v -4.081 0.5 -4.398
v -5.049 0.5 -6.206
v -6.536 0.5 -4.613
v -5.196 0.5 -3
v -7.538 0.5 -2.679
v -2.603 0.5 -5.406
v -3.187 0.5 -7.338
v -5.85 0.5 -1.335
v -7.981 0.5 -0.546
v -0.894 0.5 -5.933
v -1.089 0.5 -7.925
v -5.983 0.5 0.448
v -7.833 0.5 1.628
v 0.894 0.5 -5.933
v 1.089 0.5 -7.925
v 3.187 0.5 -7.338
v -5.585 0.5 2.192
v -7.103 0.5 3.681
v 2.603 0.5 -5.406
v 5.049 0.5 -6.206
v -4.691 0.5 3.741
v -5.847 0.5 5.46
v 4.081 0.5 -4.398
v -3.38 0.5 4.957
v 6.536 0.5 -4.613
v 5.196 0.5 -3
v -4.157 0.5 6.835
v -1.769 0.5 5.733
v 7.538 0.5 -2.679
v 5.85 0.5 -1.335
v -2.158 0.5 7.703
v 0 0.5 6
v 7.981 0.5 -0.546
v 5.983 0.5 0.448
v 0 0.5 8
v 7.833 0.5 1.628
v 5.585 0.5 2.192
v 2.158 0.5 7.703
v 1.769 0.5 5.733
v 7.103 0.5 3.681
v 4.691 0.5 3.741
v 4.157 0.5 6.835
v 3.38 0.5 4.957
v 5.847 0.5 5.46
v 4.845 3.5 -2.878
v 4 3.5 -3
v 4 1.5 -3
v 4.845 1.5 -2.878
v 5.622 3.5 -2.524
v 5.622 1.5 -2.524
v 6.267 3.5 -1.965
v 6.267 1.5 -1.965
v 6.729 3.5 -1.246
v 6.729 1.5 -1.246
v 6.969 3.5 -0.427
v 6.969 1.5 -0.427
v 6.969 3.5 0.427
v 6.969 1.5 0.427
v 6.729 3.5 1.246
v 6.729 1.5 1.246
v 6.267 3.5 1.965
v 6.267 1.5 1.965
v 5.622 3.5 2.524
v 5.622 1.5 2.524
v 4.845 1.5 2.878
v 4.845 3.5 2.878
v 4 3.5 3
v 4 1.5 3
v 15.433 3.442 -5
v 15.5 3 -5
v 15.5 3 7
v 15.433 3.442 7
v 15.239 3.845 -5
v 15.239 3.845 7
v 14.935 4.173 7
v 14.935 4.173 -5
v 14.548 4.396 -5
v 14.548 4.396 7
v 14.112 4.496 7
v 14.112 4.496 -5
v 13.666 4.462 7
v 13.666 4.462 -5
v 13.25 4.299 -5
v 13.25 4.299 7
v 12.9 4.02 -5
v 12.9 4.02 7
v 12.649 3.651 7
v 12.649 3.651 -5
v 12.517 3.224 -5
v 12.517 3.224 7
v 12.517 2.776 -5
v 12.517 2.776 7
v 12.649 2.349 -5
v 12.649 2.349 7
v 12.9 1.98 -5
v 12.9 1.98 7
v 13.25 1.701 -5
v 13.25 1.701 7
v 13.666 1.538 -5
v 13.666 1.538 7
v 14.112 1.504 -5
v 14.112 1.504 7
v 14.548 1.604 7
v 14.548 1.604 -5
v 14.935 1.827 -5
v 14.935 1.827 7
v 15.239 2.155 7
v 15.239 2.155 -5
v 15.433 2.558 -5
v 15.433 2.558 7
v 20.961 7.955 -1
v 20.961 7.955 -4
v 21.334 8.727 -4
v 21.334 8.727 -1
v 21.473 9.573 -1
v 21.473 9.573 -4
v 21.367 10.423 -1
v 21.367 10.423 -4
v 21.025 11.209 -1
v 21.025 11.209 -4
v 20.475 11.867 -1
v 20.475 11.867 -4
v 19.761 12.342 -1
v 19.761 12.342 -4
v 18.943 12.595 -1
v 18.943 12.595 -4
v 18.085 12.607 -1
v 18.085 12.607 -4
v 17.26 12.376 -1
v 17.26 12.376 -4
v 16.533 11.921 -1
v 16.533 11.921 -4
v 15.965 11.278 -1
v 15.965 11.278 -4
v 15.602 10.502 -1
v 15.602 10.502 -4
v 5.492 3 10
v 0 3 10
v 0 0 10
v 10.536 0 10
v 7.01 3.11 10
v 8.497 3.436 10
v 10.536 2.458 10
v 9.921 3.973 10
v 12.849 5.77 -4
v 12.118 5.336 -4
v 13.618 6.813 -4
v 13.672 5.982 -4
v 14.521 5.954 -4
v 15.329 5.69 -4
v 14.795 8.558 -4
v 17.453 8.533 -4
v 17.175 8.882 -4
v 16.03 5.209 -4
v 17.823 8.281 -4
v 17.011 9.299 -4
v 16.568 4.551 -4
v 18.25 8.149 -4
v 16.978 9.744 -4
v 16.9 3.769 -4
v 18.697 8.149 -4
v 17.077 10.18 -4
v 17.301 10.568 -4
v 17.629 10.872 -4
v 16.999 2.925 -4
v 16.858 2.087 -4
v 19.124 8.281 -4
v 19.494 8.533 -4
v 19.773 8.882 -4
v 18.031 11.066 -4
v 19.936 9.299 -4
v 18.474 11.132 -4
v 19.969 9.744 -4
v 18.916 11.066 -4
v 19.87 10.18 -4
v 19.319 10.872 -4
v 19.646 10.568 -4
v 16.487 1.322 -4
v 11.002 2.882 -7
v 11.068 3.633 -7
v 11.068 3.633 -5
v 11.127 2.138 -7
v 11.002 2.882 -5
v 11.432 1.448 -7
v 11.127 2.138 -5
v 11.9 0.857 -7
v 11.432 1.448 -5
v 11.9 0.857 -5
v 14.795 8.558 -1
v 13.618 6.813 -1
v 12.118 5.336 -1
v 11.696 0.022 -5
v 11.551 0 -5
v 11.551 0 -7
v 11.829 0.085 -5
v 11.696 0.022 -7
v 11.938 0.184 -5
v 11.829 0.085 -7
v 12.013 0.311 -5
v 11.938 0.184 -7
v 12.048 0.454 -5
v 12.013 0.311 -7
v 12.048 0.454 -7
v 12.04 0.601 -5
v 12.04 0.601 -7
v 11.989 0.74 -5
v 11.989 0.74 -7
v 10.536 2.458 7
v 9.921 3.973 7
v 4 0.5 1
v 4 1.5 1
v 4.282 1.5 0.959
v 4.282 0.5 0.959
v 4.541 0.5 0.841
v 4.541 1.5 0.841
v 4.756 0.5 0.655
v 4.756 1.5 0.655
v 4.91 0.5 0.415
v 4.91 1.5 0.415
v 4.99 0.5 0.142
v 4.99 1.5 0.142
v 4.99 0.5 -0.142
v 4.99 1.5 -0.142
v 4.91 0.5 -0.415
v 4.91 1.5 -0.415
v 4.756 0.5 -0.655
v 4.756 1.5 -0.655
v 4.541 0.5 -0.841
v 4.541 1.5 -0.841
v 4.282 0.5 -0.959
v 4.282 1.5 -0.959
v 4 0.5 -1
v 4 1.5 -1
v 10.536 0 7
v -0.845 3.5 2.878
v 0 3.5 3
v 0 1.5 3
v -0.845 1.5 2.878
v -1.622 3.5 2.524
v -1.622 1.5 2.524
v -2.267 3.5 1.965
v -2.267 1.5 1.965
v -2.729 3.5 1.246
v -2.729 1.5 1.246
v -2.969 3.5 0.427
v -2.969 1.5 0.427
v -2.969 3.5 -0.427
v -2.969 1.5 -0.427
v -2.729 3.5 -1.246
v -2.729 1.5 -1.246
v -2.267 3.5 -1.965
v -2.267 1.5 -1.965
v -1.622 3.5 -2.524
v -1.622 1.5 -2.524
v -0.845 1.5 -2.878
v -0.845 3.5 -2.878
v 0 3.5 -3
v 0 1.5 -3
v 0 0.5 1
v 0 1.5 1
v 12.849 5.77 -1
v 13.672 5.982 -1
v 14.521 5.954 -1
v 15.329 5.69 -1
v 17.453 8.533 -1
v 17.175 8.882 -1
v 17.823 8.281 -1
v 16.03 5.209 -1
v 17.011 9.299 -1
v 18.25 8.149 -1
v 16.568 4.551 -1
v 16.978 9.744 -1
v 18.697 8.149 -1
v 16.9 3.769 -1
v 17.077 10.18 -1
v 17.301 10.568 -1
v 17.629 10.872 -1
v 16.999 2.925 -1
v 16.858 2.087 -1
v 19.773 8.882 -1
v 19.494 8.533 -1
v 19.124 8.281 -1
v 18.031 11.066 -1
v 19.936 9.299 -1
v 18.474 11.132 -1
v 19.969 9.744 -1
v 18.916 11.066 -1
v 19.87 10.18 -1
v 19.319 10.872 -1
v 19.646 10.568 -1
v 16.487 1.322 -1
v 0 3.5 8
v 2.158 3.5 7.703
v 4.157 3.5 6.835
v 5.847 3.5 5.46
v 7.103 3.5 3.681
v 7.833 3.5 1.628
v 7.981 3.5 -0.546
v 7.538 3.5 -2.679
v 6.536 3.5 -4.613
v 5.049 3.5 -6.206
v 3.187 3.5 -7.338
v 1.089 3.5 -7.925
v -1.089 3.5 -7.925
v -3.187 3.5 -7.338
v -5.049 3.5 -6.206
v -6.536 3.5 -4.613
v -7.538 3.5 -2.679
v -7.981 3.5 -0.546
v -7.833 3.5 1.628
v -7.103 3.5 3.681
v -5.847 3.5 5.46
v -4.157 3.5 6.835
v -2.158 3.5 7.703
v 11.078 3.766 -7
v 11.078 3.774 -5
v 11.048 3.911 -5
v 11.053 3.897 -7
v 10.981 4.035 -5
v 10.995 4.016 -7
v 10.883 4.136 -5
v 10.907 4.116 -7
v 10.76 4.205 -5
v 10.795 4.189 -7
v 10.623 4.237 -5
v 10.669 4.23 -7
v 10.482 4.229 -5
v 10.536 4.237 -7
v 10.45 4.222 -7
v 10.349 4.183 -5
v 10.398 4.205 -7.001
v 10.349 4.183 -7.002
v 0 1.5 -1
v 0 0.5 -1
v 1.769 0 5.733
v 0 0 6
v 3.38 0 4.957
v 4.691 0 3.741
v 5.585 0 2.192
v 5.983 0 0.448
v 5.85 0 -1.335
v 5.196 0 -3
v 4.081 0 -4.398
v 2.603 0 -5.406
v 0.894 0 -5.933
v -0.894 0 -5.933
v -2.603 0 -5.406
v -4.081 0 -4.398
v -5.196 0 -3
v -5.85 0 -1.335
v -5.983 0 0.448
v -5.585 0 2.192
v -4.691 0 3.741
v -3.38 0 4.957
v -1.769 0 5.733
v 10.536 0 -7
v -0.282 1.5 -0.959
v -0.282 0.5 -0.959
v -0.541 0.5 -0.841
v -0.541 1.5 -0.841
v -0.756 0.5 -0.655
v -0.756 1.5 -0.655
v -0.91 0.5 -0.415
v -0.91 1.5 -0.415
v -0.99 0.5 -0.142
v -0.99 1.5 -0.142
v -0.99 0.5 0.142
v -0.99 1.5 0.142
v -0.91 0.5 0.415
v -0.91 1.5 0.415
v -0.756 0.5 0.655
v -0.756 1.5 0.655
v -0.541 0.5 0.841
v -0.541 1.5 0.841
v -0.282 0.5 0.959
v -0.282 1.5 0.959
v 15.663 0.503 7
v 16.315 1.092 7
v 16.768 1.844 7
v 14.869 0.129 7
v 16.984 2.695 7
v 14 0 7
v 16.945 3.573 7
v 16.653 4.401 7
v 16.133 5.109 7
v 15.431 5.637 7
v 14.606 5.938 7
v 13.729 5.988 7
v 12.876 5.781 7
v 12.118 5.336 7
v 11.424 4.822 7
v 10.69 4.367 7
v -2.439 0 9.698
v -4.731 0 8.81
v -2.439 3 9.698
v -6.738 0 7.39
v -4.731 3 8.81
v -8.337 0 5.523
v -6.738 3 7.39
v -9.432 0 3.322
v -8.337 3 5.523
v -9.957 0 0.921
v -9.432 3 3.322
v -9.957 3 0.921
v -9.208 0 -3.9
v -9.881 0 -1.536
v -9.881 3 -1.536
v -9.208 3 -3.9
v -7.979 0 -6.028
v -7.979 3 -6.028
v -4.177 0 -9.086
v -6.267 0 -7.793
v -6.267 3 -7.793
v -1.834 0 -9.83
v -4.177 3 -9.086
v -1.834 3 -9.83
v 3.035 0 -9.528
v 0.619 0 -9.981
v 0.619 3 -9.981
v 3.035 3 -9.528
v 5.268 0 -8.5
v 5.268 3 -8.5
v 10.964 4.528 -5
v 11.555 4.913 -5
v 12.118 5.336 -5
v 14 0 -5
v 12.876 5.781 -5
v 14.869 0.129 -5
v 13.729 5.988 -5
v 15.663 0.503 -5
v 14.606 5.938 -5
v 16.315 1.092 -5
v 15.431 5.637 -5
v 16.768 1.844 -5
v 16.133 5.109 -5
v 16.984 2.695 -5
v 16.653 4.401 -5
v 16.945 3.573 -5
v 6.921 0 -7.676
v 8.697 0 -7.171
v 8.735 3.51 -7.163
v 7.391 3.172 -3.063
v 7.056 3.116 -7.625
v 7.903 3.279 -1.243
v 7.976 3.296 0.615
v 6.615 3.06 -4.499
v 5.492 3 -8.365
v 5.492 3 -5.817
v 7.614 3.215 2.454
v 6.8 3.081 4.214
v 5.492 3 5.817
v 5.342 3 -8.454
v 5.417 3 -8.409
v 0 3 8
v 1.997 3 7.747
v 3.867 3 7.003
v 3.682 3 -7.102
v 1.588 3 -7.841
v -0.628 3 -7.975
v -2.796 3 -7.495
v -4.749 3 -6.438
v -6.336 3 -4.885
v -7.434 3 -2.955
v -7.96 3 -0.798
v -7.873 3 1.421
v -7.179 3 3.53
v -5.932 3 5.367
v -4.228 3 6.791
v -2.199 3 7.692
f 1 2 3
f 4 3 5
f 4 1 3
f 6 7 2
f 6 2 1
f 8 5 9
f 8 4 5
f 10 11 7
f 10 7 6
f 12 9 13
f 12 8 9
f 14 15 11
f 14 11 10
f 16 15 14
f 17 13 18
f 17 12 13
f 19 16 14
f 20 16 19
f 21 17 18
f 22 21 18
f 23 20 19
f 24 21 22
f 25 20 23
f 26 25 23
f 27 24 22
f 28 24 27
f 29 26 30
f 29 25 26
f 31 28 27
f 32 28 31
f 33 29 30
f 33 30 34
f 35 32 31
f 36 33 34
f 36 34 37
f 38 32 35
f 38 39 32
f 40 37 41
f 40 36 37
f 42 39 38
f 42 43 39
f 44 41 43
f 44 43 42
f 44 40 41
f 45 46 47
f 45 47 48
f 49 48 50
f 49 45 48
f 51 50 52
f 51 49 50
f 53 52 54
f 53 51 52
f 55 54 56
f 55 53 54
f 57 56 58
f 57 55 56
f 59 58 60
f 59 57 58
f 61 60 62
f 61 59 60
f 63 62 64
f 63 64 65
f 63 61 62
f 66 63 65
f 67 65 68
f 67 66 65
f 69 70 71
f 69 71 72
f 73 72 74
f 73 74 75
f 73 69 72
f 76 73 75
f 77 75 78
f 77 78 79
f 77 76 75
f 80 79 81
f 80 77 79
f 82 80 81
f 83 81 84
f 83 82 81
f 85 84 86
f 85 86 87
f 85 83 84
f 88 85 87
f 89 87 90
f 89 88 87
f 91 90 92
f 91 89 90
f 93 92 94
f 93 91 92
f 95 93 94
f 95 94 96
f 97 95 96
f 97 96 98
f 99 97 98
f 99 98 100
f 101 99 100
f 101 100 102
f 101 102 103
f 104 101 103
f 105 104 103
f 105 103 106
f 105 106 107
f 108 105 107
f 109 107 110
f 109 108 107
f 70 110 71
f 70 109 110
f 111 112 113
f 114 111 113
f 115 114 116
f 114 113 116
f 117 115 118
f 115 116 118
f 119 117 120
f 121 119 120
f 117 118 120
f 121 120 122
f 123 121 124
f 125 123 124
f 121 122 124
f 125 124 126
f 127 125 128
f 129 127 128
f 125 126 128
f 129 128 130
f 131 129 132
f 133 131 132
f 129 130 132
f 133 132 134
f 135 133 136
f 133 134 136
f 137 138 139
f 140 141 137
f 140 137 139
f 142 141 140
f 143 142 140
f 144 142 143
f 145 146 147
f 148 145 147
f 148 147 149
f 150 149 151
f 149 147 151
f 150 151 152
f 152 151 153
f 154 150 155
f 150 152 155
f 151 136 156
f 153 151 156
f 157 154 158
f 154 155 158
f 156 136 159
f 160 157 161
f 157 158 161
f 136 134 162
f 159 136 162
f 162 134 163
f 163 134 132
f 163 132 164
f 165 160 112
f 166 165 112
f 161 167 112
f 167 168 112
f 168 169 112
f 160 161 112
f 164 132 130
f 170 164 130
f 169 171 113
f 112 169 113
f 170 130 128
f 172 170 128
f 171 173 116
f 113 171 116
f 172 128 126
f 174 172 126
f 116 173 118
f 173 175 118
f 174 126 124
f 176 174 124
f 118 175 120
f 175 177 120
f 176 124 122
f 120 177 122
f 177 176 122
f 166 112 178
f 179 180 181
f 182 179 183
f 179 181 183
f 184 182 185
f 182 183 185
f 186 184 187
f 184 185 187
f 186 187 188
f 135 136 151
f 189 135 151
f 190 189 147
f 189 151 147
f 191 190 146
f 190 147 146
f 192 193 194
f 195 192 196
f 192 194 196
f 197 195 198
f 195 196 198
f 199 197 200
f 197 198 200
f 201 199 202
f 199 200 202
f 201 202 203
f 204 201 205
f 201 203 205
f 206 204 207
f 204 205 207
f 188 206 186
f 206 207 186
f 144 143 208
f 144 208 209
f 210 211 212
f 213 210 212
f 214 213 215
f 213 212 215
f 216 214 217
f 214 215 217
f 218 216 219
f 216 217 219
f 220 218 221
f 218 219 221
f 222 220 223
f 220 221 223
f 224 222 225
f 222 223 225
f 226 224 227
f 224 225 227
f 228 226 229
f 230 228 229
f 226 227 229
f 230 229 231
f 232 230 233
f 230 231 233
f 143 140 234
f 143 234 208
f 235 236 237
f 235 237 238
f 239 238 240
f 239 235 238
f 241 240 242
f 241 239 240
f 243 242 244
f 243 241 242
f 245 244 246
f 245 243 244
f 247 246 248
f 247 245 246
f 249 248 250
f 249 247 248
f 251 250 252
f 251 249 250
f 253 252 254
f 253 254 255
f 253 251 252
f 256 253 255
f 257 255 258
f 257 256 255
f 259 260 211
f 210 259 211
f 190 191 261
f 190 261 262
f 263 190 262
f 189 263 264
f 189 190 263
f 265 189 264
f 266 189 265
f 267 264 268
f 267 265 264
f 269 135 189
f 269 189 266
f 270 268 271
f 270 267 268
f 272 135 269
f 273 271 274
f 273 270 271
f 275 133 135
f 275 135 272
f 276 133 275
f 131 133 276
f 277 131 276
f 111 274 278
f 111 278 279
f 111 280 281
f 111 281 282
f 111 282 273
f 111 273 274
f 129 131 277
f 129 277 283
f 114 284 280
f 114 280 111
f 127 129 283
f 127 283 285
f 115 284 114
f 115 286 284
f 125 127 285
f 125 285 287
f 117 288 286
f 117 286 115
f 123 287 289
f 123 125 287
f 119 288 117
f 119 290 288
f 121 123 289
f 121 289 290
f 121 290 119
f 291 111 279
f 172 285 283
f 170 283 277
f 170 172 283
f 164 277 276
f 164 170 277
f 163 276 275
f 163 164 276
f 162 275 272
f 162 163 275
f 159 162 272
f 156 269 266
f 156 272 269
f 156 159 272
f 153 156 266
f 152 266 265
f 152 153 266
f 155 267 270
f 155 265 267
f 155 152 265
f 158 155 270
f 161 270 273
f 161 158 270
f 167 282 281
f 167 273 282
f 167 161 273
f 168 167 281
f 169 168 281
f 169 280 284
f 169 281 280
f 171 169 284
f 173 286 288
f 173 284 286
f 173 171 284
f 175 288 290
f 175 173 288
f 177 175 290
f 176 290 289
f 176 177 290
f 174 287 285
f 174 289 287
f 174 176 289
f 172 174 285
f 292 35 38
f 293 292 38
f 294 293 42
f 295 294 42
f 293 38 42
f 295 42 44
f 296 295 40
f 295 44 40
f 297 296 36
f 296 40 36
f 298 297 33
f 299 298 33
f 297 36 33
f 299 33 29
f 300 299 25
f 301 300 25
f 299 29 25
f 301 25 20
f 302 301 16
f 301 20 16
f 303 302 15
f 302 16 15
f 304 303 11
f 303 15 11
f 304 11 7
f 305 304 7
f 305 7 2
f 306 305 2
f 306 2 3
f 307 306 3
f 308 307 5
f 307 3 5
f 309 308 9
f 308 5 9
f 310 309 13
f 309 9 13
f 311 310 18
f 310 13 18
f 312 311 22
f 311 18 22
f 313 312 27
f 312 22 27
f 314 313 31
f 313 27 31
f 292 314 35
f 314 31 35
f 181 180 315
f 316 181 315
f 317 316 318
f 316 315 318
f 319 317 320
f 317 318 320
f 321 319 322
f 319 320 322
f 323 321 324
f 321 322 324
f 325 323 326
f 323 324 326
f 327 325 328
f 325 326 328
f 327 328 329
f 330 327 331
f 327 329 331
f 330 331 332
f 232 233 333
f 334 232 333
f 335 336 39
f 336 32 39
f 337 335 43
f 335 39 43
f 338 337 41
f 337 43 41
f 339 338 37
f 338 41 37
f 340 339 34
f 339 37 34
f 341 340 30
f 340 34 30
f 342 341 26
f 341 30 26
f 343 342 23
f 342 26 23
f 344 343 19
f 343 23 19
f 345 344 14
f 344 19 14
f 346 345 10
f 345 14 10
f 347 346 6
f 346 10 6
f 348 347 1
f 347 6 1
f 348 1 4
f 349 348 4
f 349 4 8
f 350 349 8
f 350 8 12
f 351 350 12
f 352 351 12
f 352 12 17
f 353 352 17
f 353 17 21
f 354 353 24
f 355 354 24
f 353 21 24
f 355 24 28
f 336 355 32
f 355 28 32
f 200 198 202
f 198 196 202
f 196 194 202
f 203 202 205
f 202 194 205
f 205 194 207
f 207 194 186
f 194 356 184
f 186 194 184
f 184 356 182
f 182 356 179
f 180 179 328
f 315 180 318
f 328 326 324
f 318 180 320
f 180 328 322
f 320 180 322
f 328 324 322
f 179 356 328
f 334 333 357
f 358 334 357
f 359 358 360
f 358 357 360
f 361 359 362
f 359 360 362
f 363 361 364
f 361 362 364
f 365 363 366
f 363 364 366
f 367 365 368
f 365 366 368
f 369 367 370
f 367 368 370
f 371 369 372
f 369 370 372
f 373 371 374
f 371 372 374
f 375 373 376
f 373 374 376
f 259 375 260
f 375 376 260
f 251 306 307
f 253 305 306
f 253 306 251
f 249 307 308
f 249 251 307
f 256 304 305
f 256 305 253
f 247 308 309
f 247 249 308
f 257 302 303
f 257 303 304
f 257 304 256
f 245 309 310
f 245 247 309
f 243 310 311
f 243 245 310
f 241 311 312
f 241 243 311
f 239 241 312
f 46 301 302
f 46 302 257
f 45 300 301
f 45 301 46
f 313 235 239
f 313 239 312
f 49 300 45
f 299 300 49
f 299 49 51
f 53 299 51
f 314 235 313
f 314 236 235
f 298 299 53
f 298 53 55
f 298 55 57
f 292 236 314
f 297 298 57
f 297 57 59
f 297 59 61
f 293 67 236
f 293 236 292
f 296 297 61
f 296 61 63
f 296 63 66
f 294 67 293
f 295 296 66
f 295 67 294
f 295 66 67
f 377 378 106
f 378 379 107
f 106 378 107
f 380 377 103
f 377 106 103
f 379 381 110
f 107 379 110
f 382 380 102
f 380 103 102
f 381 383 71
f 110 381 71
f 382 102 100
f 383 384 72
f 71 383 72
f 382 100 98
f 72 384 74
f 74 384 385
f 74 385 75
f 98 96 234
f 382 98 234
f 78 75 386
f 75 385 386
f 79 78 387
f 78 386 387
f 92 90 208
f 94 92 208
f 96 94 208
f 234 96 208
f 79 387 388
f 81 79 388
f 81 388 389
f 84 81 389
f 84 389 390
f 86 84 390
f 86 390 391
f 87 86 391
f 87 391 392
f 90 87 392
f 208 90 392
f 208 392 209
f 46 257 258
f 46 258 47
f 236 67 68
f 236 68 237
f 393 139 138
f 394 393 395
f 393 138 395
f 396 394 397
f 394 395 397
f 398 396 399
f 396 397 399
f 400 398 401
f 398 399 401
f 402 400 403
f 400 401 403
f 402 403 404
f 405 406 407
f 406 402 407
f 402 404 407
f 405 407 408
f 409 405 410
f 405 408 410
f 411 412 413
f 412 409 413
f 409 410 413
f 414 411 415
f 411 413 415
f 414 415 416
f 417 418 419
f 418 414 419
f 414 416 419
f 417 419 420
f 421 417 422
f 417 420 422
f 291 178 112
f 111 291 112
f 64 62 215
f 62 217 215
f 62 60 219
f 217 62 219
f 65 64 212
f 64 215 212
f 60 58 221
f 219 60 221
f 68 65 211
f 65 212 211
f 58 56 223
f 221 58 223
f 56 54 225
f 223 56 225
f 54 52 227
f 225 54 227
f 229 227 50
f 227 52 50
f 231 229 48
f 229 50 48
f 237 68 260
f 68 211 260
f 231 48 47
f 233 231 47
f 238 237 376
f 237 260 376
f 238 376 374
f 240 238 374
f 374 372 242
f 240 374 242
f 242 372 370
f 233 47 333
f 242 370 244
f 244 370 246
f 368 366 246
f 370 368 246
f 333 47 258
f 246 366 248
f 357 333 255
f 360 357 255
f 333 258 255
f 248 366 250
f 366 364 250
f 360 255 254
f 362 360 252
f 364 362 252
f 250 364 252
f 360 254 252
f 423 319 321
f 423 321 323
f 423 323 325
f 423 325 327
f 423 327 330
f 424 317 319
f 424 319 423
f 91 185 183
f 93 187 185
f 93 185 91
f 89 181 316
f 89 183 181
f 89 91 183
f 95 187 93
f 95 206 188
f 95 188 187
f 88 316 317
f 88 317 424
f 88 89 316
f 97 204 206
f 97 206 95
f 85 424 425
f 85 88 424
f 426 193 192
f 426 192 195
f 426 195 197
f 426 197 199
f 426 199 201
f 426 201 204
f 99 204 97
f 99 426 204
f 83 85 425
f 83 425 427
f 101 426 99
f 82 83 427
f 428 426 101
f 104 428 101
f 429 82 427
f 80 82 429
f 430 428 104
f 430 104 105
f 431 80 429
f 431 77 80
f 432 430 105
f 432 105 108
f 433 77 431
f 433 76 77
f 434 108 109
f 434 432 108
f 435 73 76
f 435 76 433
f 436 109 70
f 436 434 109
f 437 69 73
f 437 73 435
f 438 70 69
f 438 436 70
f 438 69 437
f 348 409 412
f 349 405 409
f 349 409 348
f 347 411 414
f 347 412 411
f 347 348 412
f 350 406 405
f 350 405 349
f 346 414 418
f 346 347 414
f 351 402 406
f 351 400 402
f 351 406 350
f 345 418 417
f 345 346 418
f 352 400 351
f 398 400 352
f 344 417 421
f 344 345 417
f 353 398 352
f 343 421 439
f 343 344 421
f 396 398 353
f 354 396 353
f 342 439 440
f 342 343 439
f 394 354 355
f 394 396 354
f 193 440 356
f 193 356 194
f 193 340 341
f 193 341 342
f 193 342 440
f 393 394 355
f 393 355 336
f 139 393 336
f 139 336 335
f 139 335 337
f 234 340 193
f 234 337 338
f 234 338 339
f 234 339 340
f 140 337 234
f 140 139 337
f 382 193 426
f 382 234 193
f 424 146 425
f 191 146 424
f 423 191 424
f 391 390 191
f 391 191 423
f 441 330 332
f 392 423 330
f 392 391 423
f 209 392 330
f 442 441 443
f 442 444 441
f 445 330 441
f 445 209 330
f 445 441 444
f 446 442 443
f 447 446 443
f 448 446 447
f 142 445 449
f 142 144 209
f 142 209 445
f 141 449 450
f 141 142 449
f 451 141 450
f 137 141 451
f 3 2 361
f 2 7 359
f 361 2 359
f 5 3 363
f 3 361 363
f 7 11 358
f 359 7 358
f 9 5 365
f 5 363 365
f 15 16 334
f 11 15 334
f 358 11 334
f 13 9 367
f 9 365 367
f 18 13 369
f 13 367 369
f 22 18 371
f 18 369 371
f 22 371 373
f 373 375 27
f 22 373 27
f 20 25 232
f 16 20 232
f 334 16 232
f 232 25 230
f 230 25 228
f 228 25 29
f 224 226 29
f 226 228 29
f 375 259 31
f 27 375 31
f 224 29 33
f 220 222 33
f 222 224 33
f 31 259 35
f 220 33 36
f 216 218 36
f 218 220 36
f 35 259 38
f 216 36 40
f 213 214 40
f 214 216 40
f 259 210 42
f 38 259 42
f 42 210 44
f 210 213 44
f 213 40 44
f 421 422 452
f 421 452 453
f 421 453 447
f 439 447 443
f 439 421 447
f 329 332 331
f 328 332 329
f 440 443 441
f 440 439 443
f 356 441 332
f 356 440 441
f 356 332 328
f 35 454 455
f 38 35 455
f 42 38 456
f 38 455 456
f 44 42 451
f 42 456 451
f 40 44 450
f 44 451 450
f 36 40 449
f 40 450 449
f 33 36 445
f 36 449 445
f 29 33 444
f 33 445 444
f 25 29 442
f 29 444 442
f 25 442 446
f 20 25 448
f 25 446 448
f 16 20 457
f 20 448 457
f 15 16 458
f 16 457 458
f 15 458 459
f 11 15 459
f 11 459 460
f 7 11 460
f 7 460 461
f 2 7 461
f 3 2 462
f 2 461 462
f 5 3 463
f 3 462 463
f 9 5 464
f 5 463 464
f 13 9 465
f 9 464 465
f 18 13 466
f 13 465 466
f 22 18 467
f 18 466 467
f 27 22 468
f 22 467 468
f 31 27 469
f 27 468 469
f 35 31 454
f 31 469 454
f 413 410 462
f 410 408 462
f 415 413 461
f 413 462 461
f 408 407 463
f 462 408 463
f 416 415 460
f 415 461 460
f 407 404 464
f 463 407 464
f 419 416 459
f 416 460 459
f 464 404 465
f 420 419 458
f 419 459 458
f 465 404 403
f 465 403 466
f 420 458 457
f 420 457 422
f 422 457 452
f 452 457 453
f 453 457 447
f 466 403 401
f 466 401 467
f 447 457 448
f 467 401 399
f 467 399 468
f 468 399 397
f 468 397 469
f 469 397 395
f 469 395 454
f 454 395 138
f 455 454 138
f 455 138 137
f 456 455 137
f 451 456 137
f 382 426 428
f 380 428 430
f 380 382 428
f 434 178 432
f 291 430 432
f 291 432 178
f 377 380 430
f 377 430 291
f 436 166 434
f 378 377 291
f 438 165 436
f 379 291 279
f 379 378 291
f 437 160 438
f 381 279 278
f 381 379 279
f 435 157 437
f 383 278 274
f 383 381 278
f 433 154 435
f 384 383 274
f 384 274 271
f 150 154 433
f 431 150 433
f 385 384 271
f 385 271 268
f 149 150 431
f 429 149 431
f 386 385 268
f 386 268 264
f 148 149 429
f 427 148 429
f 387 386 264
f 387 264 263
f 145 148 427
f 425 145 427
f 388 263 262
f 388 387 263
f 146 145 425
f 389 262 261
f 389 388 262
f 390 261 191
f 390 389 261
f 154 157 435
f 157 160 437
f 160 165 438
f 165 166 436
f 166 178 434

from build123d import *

# Parameters (mm, degrees)
SKETCH1_R           = 10
BOSS_EXTRUDE1_DEPTH = 3
BOSS_EXTRUDE2_DEPTH = 10
CUT_EXTRUDE1_DEPTH  = 8
BOSS_EXTRUDE6_START = -4
BOSS_EXTRUDE6_DEPTH = 3
FILLET1_R           = 10
SKETCH4_R           = 2.999999999999999
CUT_EXTRUDE2_DEPTH  = 2
SKETCH5_R           = 8
CUT_EXTRUDE3_DEPTH  = 2.5
SKETCH6_R           = 6
CUT_EXTRUDE4_DEPTH  = 2.5
CUT_EXTRUDE5_DEPTH  = 3
HOLE1_START         = -5
HOLE1_OUTLINE_R     = 1.5
HOLE1_DEPTH         = 12
SKETCH14_R          = 8
BOSS_EXTRUDE5_DEPTH = 3
CUT_EXTRUDE6_DEPTH  = 2
CUT_EXTRUDE7_DEPTH  = 2
FILLET5_R           = 0.5


# Read off the part's stored shape, not the designer's step: Boss-Extrude6, Hole1
with BuildPart() as part:
    # Sketch1 → Boss-Extrude1 (new body)
    with BuildSketch(Plane(origin=(0, 0, 0), x_dir=(1, 0, 0), z_dir=(0, 1, 0))):
        with Locations(Location((0, 0, 0), (0, 0, 270))):
            Circle(SKETCH1_R)
    extrude(amount=BOSS_EXTRUDE1_DEPTH)

    # Sketch2 → Boss-Extrude2 (add, symmetric)
    with BuildSketch(Plane.XY):
        with BuildLine():
            ThreePointArc((12.118241851863406, 5.336447361256301), (9.005233792596329, 3.6012213229490353), (5.492348724463198, 2.9999999999999964))
            Line((5.492348724463198, 2.999999999999999), (5.4923487244631986, 0))
            Line((5.4923487244631986, 0), (14, 0))
            ThreePointArc((14, 8.9e-16), (11.170747264402763, 2.002338254659653), (12.118241851863406, 5.336447361256301))
        make_face()
        with BuildLine():
            ThreePointArc((17, 3), (15.295130409570831, 5.706037180491961), (12.118241851863406, 5.336447361256301))
            ThreePointArc((12.118241851863406, 5.336447361256301), (11.170747264402763, 2.002338254659653), (14, 8.9e-16))
            ThreePointArc((14, 8.9e-16), (15.408414688357675, 0.3511572214232217), (16.48711271766513, 1.3224212895877674))
            ThreePointArc((16.48711271766513, 1.3224212895877674), (16.868914267889107, 2.1228848858317937), (17, 2.999999999999999))
        make_face()
        Polygon((5.492348724463198, 2.999999999999999), (5.4923487244631986, -2e-17), (0, 0), (0, 3.000000000000001), align=None)
    extrude(amount=BOSS_EXTRUDE2_DEPTH, both=True)

    # Sketch3 → Cut-Extrude1 (cut, symmetric)
    with BuildSketch(Plane(origin=(0, 3, 0), x_dir=(1, 0, 0), z_dir=(0, 1, 0))):
        with BuildLine():
            ThreePointArc((5.49234872446292, 8.356680291173674), (6.353206012799225, 7.7224849212498805), (7.141428428542965, 6.999999999999883))
            Line((7.141428428543003, 7), (20.223415730337077, 7))
            Line((20.223415730337077, 7), (20.223415730337077, 10))
            Line((20.223415730337077, 10), (5.492348724463198, 10))
            Line((5.492348724463198, 10), (5.492348724463198, 8.356680291173774))
        make_face()
        with BuildLine():
            Line((5.492348724463198, 10), (0, 10))
            ThreePointArc((6.1e-16, 10), (2.8664609790003457, 9.580365413483369), (5.49234872446292, 8.356680291173674))
            Line((5.492348724463198, 8.356680291173774), (5.492348724463198, 10))
        make_face()
    extrude(amount=CUT_EXTRUDE1_DEPTH, both=True, mode=Mode.SUBTRACT)

    # Boss-Extrude6 outline → Boss-Extrude6 (add)
    with BuildSketch(Plane.XY.offset(BOSS_EXTRUDE6_START)):
        with BuildLine():
            ThreePointArc((20.960655945, 7.95472187), (19.761477117, 12.341770325), (15.602307947, 10.501787764))
            ThreePointArc((15.602307947, 10.501787764), (14.249766943, 7.656401864), (12.118241854, 5.336447363))
            ThreePointArc((12.118241854, 5.336447363), (16.029708075, 5.209136739), (16.487112718, 1.32242129))
            Line((16.487112718, 1.32242129), (20.960655945, 7.95472187))
        make_face()
    extrude(amount=BOSS_EXTRUDE6_DEPTH)

    # Fillet1
    fillet1_edges = [part.edges().sort_by_distance(p)[0] for p in [
        (7.141428428542984, 1.5647577911253236, -6.999999999999941),
    ]]
    fillet(fillet1_edges, radius=FILLET1_R)

    # Sketch4 → Cut-Extrude2 (cut, symmetric)
    with BuildSketch(Plane.XY.offset(-7)):
        with Locations((14, 3)):
            Circle(SKETCH4_R)
    extrude(amount=CUT_EXTRUDE2_DEPTH, both=True, mode=Mode.SUBTRACT)

    # Sketch5 → Cut-Extrude3 (cut, symmetric)
    with BuildSketch(Plane(origin=(0, 3, 0), x_dir=(1, 0, 0), z_dir=(0, 1, 0))):
        with Locations(Location((0, 0, 0), (0, 0, 270))):
            Circle(SKETCH5_R)
    extrude(amount=CUT_EXTRUDE3_DEPTH, both=True, mode=Mode.SUBTRACT)

    # Sketch6 → Cut-Extrude4 (cut, symmetric)
    with BuildSketch(Plane(origin=(0, 0.49999999999999956, 0), x_dir=(1, 0, 0), z_dir=(0, 1, 0))):
        with Locations(Location((0, 0, 0), (0, 0, 270))):
            Circle(SKETCH6_R)
    extrude(amount=CUT_EXTRUDE4_DEPTH, both=True, mode=Mode.SUBTRACT)

    # Sketch7 → Cut-Extrude5 (cut)
    with BuildSketch(Plane(origin=(0, 0, 10), x_dir=(-1, 0, 0), z_dir=(0, 0, -1))):
        with BuildLine():
            Line((-14, -8.9e-16), (-10.535653752852738, 0))
            Line((-10.535653752852738, 0), (-10.535653752852738, 2.4576290293685137))
            Line((-10.535653752852737, 2.4576290293685137), (-9.920734510417693, 3.9730542612258857))
            ThreePointArc((-9.92073451041755, 3.973054261225835), (-11.061368455067633, 4.58724848237155), (-12.118241851863406, 5.3364473612562975))
            ThreePointArc((-12.118241851863406, 5.336447361256301), (-16.829252735597237, 3.9976617453403454), (-14.000000000000002, -2.22e-15))
        make_face()
    extrude(amount=CUT_EXTRUDE5_DEPTH, mode=Mode.SUBTRACT)

    # Hole1 outline → Hole1 (cut)
    with BuildSketch(Plane.XY.offset(HOLE1_START)):
        with Locations((14, 3)):
            Circle(HOLE1_OUTLINE_R)
    extrude(amount=HOLE1_DEPTH, mode=Mode.SUBTRACT)

    # Sketch13 → Ø3.0 mm Dowel Holes1 (revolve, cut)
    with BuildSketch(Plane(origin=(18.473543227765962, 9.632300580440345, -4), x_dir=(0, 1, 0), z_dir=(1, 0, 0))):
        Polygon((0, 0), (-3.43e-15, 14), (1.4999999999999967, 14), (1.4999999999999876, -1.37e-15), align=None)
    revolve(axis=Axis((18.473543227765962, 9.632300580440345, -10.34999999999999), (0, 0, 1)), mode=Mode.SUBTRACT)

    # Fillet5
    # the kernel refuses this fillet: 0.5 mm, written as the material it takes off along each edge
    with BuildSketch(Plane(origin=(14, 0, -13.123724356958832), x_dir=(-1, 0, 0), z_dir=(0, 0, 1))) as fillet5_piece_1:
        with BuildLine():
            CenterArc((2.4494897427835323, -0.5), FILLET5_R, 90, 135.584691402803)
            ThreePointArc((2.0995626366716245, -0.8571428571428326), (1.1338934190278316, -0.22253970068240747), (0, 0))
            Line((0, 0), (2.4494897427835323, 0))
        make_face()
    extrude(amount=8.123724356958832, mode=Mode.SUBTRACT)
    with BuildSketch(Plane(origin=(12.118241851863406, 5.336447361256301, -12.280688138935865), x_dir=(-0.5249896042858109, -0.8511086390066945, 0), z_dir=(0, 0, 1))) as fillet5_piece_2:
        with BuildLine():
            CenterArc((2.168111981095238, -0.471365198670144), FILLET5_R, 109.4847340766443, 129.55434819465773)
            ThreePointArc((1.9108853465691438, -0.9001244067233106), (0.9779980770614156, -0.4021790549421846), (0, 0))
            ThreePointArc((0, 0), (1.0006670681978018, -0.17180880797913198), (2.0013341363956045, 7e-17))
        make_face()
    extrude(amount=7.280688138935865, mode=Mode.SUBTRACT)


with BuildPart() as body_2:
    # Sketch14 → Boss-Extrude5 (new body)
    with BuildSketch(Plane(origin=(0, 0.49999999999999956, 0), x_dir=(1, 0, 0), z_dir=(0, 1, 0))):
        with Locations(Location((0, 0, 0), (0, 0, 270))):
            Circle(SKETCH14_R)
    extrude(amount=BOSS_EXTRUDE5_DEPTH)

    # Sketch15 → Cut-Extrude6 (cut)
    with BuildSketch(Plane(origin=(0, 3.4999999999999996, 0), x_dir=(1, 0, 0), z_dir=(0, 1, 0))):
        with BuildLine():
            Line((0, 3.000000000000001), (4, 3))
            ThreePointArc((4, 3), (7, 0), (4, -3))
            Line((4, -3), (0, -3.000000000000001))
            ThreePointArc((0, -3.000000000000001), (-3.000000000000001, 3.7e-16), (0, 3.000000000000001))
        make_face()
    extrude(amount=-CUT_EXTRUDE6_DEPTH, mode=Mode.SUBTRACT)

    # Sketch17 → Cut-Extrude7 (cut)
    with BuildSketch(Plane(origin=(0, 1.4999999999999996, 0), x_dir=(1, 0, 0), z_dir=(0, 1, 0))):
        with BuildLine():
            Line((-4.3e-16, -1.0000000000000009), (4, -1))
            ThreePointArc((4, -1), (5, 0), (4, 1))
            Line((4, 1), (0, 1.0000000000000009))
            ThreePointArc((0, 1.0000000000000009), (-1.0000000000000009, 1.2e-16), (-4.3e-16, -1.0000000000000009))
        make_face()
    extrude(amount=-CUT_EXTRUDE7_DEPTH, mode=Mode.SUBTRACT)


solid = Compound([part.part, body_2.part])
